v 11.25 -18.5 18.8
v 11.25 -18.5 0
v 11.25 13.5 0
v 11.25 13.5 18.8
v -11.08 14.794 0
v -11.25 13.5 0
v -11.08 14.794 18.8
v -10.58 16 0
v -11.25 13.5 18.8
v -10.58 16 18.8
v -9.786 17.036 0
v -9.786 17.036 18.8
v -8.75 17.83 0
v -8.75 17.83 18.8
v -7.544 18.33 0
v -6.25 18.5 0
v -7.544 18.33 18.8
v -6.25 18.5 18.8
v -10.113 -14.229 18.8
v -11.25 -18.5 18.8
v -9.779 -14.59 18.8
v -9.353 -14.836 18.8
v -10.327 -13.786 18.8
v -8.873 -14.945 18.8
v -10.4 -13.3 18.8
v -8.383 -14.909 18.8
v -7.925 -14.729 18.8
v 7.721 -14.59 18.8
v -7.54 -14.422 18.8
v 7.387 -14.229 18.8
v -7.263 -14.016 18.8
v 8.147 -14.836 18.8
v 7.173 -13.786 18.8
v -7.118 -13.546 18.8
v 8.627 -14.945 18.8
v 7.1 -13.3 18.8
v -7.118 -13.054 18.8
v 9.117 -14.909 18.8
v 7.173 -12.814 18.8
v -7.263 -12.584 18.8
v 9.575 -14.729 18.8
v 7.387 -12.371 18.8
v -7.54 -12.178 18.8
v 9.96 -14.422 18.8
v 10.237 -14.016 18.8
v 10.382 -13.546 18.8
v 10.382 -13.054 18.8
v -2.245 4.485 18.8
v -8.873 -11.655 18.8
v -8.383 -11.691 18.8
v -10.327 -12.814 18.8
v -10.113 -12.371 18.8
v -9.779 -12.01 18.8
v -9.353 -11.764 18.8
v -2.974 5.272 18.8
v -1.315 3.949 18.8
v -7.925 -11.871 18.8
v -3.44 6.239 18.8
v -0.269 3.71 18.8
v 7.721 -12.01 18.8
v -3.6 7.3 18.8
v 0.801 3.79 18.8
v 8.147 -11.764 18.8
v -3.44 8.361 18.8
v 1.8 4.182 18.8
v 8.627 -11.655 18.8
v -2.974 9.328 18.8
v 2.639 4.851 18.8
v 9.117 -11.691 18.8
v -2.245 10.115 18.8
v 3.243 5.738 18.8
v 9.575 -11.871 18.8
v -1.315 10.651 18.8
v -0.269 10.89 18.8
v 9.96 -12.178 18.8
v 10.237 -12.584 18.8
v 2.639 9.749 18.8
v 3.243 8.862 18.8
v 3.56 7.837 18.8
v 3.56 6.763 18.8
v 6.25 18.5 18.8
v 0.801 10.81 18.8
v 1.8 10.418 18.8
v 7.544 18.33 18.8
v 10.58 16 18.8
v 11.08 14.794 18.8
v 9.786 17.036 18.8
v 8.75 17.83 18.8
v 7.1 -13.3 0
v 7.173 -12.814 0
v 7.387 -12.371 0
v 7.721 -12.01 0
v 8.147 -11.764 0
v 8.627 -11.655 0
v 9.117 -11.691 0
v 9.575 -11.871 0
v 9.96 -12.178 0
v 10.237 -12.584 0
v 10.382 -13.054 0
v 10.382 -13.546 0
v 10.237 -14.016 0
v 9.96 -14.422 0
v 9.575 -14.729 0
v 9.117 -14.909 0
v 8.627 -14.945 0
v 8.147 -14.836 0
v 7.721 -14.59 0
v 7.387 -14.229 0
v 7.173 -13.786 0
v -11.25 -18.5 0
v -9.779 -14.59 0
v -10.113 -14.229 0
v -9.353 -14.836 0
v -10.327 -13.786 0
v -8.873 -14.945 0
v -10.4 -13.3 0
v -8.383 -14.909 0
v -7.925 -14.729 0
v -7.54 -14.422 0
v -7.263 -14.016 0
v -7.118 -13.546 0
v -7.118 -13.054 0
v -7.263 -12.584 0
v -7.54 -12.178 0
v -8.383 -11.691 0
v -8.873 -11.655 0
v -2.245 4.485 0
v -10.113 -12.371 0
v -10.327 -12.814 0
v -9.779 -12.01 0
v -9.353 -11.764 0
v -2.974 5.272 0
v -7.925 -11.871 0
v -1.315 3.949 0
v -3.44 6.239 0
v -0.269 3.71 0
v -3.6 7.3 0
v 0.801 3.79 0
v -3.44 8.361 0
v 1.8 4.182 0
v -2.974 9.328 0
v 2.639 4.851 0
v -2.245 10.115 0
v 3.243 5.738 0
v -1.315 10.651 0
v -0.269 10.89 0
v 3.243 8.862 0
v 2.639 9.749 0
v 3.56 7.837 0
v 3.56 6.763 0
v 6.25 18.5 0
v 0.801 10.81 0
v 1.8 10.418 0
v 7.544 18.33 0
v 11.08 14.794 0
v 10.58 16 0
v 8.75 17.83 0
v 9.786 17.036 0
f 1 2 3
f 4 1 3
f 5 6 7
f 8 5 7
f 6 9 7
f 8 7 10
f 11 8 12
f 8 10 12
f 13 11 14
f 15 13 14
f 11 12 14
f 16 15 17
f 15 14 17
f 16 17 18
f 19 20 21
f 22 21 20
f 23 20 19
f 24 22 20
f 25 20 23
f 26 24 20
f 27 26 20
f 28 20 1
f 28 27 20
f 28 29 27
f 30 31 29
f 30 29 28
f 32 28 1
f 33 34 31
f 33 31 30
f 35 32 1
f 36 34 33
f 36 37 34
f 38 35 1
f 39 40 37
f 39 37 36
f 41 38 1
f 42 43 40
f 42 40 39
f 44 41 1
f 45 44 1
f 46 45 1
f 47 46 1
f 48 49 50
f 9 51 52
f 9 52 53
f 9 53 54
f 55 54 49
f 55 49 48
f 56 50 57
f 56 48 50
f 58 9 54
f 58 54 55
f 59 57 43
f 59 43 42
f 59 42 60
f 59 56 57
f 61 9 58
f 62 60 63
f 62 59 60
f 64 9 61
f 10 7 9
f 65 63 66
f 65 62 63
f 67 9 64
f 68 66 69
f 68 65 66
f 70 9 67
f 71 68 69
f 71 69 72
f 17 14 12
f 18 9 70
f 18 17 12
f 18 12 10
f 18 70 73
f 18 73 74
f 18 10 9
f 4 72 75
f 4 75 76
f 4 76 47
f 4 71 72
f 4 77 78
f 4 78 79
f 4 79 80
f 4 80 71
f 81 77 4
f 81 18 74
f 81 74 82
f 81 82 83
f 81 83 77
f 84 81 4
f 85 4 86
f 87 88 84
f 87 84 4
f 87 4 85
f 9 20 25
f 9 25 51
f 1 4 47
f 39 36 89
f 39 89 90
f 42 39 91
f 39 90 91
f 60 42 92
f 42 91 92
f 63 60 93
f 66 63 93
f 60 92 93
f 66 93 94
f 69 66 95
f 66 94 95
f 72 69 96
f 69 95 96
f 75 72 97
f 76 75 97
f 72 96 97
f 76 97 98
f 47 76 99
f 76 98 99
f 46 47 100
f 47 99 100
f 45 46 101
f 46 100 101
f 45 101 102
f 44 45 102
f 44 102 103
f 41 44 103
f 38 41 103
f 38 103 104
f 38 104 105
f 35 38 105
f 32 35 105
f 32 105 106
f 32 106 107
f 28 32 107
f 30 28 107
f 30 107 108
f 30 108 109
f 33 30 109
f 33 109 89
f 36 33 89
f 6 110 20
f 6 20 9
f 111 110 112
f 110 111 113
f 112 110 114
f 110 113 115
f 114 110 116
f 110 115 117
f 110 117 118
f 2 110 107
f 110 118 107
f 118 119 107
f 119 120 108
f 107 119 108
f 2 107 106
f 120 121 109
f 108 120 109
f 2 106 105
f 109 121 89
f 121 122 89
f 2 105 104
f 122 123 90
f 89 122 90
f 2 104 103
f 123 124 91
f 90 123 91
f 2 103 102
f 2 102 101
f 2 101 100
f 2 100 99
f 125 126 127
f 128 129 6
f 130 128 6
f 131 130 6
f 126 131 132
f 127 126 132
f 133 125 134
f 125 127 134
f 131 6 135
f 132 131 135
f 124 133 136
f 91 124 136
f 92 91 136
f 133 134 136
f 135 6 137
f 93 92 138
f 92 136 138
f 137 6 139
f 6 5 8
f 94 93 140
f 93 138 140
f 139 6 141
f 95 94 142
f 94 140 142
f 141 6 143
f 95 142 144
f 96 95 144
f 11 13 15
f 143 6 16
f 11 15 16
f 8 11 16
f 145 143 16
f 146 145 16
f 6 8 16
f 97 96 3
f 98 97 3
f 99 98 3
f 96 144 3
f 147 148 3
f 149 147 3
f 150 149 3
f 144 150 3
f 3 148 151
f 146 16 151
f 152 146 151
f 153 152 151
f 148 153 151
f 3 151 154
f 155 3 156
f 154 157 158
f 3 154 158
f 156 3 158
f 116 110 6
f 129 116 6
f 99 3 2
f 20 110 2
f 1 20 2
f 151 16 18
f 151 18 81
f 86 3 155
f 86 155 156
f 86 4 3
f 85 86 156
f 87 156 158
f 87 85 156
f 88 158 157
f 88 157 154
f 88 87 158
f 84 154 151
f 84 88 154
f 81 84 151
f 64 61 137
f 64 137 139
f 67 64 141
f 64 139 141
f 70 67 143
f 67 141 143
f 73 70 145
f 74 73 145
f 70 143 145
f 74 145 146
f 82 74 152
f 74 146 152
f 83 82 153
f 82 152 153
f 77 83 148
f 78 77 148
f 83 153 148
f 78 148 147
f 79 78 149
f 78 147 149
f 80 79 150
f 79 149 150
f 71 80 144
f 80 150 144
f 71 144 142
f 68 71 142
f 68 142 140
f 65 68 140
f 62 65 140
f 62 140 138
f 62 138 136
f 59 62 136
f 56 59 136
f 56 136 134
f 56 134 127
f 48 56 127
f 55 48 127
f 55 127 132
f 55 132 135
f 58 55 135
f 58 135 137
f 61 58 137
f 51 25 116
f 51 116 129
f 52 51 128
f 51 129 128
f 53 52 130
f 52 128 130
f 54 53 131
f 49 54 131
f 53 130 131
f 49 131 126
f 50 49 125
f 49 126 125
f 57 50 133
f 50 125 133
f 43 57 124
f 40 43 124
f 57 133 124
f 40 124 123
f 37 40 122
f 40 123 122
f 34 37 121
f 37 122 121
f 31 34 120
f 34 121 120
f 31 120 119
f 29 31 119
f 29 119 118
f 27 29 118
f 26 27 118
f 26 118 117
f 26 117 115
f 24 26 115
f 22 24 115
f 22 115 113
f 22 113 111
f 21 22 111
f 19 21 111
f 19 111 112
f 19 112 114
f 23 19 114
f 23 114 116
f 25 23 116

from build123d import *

# Parameters (mm, degrees)
F0_W     = 22.5
F0_H     = 37
F1_DEPTH = 18.8
F2_R     = 5
F4_D     = 3.3
F6_D     = 7.2


with BuildPart() as f1:
    # F0 (on Top) → F1 (new body)
    with BuildSketch(Plane.XY):
        Rectangle(F0_W, F0_H)
    extrude(amount=F1_DEPTH)

    # F2
    f2_edges = [f1.edges().sort_by_distance(p)[0] for p in [
        (11.25, 18.5, 9.4),
        (-11.25, 18.5, 9.4),
    ]]
    fillet(f2_edges, radius=F2_R)

    # F4 (through all)
    with Locations(Plane.XY.offset(18.8)):
        with Locations((-8.75, -13.3), (8.75, -13.3)):
            Hole(F4_D / 2)

    # F6 (through all)
    with Locations(Plane.XY.offset(18.8)):
        with Locations((0, 7.3)):
            Hole(F6_D / 2)


solid = f1.part
